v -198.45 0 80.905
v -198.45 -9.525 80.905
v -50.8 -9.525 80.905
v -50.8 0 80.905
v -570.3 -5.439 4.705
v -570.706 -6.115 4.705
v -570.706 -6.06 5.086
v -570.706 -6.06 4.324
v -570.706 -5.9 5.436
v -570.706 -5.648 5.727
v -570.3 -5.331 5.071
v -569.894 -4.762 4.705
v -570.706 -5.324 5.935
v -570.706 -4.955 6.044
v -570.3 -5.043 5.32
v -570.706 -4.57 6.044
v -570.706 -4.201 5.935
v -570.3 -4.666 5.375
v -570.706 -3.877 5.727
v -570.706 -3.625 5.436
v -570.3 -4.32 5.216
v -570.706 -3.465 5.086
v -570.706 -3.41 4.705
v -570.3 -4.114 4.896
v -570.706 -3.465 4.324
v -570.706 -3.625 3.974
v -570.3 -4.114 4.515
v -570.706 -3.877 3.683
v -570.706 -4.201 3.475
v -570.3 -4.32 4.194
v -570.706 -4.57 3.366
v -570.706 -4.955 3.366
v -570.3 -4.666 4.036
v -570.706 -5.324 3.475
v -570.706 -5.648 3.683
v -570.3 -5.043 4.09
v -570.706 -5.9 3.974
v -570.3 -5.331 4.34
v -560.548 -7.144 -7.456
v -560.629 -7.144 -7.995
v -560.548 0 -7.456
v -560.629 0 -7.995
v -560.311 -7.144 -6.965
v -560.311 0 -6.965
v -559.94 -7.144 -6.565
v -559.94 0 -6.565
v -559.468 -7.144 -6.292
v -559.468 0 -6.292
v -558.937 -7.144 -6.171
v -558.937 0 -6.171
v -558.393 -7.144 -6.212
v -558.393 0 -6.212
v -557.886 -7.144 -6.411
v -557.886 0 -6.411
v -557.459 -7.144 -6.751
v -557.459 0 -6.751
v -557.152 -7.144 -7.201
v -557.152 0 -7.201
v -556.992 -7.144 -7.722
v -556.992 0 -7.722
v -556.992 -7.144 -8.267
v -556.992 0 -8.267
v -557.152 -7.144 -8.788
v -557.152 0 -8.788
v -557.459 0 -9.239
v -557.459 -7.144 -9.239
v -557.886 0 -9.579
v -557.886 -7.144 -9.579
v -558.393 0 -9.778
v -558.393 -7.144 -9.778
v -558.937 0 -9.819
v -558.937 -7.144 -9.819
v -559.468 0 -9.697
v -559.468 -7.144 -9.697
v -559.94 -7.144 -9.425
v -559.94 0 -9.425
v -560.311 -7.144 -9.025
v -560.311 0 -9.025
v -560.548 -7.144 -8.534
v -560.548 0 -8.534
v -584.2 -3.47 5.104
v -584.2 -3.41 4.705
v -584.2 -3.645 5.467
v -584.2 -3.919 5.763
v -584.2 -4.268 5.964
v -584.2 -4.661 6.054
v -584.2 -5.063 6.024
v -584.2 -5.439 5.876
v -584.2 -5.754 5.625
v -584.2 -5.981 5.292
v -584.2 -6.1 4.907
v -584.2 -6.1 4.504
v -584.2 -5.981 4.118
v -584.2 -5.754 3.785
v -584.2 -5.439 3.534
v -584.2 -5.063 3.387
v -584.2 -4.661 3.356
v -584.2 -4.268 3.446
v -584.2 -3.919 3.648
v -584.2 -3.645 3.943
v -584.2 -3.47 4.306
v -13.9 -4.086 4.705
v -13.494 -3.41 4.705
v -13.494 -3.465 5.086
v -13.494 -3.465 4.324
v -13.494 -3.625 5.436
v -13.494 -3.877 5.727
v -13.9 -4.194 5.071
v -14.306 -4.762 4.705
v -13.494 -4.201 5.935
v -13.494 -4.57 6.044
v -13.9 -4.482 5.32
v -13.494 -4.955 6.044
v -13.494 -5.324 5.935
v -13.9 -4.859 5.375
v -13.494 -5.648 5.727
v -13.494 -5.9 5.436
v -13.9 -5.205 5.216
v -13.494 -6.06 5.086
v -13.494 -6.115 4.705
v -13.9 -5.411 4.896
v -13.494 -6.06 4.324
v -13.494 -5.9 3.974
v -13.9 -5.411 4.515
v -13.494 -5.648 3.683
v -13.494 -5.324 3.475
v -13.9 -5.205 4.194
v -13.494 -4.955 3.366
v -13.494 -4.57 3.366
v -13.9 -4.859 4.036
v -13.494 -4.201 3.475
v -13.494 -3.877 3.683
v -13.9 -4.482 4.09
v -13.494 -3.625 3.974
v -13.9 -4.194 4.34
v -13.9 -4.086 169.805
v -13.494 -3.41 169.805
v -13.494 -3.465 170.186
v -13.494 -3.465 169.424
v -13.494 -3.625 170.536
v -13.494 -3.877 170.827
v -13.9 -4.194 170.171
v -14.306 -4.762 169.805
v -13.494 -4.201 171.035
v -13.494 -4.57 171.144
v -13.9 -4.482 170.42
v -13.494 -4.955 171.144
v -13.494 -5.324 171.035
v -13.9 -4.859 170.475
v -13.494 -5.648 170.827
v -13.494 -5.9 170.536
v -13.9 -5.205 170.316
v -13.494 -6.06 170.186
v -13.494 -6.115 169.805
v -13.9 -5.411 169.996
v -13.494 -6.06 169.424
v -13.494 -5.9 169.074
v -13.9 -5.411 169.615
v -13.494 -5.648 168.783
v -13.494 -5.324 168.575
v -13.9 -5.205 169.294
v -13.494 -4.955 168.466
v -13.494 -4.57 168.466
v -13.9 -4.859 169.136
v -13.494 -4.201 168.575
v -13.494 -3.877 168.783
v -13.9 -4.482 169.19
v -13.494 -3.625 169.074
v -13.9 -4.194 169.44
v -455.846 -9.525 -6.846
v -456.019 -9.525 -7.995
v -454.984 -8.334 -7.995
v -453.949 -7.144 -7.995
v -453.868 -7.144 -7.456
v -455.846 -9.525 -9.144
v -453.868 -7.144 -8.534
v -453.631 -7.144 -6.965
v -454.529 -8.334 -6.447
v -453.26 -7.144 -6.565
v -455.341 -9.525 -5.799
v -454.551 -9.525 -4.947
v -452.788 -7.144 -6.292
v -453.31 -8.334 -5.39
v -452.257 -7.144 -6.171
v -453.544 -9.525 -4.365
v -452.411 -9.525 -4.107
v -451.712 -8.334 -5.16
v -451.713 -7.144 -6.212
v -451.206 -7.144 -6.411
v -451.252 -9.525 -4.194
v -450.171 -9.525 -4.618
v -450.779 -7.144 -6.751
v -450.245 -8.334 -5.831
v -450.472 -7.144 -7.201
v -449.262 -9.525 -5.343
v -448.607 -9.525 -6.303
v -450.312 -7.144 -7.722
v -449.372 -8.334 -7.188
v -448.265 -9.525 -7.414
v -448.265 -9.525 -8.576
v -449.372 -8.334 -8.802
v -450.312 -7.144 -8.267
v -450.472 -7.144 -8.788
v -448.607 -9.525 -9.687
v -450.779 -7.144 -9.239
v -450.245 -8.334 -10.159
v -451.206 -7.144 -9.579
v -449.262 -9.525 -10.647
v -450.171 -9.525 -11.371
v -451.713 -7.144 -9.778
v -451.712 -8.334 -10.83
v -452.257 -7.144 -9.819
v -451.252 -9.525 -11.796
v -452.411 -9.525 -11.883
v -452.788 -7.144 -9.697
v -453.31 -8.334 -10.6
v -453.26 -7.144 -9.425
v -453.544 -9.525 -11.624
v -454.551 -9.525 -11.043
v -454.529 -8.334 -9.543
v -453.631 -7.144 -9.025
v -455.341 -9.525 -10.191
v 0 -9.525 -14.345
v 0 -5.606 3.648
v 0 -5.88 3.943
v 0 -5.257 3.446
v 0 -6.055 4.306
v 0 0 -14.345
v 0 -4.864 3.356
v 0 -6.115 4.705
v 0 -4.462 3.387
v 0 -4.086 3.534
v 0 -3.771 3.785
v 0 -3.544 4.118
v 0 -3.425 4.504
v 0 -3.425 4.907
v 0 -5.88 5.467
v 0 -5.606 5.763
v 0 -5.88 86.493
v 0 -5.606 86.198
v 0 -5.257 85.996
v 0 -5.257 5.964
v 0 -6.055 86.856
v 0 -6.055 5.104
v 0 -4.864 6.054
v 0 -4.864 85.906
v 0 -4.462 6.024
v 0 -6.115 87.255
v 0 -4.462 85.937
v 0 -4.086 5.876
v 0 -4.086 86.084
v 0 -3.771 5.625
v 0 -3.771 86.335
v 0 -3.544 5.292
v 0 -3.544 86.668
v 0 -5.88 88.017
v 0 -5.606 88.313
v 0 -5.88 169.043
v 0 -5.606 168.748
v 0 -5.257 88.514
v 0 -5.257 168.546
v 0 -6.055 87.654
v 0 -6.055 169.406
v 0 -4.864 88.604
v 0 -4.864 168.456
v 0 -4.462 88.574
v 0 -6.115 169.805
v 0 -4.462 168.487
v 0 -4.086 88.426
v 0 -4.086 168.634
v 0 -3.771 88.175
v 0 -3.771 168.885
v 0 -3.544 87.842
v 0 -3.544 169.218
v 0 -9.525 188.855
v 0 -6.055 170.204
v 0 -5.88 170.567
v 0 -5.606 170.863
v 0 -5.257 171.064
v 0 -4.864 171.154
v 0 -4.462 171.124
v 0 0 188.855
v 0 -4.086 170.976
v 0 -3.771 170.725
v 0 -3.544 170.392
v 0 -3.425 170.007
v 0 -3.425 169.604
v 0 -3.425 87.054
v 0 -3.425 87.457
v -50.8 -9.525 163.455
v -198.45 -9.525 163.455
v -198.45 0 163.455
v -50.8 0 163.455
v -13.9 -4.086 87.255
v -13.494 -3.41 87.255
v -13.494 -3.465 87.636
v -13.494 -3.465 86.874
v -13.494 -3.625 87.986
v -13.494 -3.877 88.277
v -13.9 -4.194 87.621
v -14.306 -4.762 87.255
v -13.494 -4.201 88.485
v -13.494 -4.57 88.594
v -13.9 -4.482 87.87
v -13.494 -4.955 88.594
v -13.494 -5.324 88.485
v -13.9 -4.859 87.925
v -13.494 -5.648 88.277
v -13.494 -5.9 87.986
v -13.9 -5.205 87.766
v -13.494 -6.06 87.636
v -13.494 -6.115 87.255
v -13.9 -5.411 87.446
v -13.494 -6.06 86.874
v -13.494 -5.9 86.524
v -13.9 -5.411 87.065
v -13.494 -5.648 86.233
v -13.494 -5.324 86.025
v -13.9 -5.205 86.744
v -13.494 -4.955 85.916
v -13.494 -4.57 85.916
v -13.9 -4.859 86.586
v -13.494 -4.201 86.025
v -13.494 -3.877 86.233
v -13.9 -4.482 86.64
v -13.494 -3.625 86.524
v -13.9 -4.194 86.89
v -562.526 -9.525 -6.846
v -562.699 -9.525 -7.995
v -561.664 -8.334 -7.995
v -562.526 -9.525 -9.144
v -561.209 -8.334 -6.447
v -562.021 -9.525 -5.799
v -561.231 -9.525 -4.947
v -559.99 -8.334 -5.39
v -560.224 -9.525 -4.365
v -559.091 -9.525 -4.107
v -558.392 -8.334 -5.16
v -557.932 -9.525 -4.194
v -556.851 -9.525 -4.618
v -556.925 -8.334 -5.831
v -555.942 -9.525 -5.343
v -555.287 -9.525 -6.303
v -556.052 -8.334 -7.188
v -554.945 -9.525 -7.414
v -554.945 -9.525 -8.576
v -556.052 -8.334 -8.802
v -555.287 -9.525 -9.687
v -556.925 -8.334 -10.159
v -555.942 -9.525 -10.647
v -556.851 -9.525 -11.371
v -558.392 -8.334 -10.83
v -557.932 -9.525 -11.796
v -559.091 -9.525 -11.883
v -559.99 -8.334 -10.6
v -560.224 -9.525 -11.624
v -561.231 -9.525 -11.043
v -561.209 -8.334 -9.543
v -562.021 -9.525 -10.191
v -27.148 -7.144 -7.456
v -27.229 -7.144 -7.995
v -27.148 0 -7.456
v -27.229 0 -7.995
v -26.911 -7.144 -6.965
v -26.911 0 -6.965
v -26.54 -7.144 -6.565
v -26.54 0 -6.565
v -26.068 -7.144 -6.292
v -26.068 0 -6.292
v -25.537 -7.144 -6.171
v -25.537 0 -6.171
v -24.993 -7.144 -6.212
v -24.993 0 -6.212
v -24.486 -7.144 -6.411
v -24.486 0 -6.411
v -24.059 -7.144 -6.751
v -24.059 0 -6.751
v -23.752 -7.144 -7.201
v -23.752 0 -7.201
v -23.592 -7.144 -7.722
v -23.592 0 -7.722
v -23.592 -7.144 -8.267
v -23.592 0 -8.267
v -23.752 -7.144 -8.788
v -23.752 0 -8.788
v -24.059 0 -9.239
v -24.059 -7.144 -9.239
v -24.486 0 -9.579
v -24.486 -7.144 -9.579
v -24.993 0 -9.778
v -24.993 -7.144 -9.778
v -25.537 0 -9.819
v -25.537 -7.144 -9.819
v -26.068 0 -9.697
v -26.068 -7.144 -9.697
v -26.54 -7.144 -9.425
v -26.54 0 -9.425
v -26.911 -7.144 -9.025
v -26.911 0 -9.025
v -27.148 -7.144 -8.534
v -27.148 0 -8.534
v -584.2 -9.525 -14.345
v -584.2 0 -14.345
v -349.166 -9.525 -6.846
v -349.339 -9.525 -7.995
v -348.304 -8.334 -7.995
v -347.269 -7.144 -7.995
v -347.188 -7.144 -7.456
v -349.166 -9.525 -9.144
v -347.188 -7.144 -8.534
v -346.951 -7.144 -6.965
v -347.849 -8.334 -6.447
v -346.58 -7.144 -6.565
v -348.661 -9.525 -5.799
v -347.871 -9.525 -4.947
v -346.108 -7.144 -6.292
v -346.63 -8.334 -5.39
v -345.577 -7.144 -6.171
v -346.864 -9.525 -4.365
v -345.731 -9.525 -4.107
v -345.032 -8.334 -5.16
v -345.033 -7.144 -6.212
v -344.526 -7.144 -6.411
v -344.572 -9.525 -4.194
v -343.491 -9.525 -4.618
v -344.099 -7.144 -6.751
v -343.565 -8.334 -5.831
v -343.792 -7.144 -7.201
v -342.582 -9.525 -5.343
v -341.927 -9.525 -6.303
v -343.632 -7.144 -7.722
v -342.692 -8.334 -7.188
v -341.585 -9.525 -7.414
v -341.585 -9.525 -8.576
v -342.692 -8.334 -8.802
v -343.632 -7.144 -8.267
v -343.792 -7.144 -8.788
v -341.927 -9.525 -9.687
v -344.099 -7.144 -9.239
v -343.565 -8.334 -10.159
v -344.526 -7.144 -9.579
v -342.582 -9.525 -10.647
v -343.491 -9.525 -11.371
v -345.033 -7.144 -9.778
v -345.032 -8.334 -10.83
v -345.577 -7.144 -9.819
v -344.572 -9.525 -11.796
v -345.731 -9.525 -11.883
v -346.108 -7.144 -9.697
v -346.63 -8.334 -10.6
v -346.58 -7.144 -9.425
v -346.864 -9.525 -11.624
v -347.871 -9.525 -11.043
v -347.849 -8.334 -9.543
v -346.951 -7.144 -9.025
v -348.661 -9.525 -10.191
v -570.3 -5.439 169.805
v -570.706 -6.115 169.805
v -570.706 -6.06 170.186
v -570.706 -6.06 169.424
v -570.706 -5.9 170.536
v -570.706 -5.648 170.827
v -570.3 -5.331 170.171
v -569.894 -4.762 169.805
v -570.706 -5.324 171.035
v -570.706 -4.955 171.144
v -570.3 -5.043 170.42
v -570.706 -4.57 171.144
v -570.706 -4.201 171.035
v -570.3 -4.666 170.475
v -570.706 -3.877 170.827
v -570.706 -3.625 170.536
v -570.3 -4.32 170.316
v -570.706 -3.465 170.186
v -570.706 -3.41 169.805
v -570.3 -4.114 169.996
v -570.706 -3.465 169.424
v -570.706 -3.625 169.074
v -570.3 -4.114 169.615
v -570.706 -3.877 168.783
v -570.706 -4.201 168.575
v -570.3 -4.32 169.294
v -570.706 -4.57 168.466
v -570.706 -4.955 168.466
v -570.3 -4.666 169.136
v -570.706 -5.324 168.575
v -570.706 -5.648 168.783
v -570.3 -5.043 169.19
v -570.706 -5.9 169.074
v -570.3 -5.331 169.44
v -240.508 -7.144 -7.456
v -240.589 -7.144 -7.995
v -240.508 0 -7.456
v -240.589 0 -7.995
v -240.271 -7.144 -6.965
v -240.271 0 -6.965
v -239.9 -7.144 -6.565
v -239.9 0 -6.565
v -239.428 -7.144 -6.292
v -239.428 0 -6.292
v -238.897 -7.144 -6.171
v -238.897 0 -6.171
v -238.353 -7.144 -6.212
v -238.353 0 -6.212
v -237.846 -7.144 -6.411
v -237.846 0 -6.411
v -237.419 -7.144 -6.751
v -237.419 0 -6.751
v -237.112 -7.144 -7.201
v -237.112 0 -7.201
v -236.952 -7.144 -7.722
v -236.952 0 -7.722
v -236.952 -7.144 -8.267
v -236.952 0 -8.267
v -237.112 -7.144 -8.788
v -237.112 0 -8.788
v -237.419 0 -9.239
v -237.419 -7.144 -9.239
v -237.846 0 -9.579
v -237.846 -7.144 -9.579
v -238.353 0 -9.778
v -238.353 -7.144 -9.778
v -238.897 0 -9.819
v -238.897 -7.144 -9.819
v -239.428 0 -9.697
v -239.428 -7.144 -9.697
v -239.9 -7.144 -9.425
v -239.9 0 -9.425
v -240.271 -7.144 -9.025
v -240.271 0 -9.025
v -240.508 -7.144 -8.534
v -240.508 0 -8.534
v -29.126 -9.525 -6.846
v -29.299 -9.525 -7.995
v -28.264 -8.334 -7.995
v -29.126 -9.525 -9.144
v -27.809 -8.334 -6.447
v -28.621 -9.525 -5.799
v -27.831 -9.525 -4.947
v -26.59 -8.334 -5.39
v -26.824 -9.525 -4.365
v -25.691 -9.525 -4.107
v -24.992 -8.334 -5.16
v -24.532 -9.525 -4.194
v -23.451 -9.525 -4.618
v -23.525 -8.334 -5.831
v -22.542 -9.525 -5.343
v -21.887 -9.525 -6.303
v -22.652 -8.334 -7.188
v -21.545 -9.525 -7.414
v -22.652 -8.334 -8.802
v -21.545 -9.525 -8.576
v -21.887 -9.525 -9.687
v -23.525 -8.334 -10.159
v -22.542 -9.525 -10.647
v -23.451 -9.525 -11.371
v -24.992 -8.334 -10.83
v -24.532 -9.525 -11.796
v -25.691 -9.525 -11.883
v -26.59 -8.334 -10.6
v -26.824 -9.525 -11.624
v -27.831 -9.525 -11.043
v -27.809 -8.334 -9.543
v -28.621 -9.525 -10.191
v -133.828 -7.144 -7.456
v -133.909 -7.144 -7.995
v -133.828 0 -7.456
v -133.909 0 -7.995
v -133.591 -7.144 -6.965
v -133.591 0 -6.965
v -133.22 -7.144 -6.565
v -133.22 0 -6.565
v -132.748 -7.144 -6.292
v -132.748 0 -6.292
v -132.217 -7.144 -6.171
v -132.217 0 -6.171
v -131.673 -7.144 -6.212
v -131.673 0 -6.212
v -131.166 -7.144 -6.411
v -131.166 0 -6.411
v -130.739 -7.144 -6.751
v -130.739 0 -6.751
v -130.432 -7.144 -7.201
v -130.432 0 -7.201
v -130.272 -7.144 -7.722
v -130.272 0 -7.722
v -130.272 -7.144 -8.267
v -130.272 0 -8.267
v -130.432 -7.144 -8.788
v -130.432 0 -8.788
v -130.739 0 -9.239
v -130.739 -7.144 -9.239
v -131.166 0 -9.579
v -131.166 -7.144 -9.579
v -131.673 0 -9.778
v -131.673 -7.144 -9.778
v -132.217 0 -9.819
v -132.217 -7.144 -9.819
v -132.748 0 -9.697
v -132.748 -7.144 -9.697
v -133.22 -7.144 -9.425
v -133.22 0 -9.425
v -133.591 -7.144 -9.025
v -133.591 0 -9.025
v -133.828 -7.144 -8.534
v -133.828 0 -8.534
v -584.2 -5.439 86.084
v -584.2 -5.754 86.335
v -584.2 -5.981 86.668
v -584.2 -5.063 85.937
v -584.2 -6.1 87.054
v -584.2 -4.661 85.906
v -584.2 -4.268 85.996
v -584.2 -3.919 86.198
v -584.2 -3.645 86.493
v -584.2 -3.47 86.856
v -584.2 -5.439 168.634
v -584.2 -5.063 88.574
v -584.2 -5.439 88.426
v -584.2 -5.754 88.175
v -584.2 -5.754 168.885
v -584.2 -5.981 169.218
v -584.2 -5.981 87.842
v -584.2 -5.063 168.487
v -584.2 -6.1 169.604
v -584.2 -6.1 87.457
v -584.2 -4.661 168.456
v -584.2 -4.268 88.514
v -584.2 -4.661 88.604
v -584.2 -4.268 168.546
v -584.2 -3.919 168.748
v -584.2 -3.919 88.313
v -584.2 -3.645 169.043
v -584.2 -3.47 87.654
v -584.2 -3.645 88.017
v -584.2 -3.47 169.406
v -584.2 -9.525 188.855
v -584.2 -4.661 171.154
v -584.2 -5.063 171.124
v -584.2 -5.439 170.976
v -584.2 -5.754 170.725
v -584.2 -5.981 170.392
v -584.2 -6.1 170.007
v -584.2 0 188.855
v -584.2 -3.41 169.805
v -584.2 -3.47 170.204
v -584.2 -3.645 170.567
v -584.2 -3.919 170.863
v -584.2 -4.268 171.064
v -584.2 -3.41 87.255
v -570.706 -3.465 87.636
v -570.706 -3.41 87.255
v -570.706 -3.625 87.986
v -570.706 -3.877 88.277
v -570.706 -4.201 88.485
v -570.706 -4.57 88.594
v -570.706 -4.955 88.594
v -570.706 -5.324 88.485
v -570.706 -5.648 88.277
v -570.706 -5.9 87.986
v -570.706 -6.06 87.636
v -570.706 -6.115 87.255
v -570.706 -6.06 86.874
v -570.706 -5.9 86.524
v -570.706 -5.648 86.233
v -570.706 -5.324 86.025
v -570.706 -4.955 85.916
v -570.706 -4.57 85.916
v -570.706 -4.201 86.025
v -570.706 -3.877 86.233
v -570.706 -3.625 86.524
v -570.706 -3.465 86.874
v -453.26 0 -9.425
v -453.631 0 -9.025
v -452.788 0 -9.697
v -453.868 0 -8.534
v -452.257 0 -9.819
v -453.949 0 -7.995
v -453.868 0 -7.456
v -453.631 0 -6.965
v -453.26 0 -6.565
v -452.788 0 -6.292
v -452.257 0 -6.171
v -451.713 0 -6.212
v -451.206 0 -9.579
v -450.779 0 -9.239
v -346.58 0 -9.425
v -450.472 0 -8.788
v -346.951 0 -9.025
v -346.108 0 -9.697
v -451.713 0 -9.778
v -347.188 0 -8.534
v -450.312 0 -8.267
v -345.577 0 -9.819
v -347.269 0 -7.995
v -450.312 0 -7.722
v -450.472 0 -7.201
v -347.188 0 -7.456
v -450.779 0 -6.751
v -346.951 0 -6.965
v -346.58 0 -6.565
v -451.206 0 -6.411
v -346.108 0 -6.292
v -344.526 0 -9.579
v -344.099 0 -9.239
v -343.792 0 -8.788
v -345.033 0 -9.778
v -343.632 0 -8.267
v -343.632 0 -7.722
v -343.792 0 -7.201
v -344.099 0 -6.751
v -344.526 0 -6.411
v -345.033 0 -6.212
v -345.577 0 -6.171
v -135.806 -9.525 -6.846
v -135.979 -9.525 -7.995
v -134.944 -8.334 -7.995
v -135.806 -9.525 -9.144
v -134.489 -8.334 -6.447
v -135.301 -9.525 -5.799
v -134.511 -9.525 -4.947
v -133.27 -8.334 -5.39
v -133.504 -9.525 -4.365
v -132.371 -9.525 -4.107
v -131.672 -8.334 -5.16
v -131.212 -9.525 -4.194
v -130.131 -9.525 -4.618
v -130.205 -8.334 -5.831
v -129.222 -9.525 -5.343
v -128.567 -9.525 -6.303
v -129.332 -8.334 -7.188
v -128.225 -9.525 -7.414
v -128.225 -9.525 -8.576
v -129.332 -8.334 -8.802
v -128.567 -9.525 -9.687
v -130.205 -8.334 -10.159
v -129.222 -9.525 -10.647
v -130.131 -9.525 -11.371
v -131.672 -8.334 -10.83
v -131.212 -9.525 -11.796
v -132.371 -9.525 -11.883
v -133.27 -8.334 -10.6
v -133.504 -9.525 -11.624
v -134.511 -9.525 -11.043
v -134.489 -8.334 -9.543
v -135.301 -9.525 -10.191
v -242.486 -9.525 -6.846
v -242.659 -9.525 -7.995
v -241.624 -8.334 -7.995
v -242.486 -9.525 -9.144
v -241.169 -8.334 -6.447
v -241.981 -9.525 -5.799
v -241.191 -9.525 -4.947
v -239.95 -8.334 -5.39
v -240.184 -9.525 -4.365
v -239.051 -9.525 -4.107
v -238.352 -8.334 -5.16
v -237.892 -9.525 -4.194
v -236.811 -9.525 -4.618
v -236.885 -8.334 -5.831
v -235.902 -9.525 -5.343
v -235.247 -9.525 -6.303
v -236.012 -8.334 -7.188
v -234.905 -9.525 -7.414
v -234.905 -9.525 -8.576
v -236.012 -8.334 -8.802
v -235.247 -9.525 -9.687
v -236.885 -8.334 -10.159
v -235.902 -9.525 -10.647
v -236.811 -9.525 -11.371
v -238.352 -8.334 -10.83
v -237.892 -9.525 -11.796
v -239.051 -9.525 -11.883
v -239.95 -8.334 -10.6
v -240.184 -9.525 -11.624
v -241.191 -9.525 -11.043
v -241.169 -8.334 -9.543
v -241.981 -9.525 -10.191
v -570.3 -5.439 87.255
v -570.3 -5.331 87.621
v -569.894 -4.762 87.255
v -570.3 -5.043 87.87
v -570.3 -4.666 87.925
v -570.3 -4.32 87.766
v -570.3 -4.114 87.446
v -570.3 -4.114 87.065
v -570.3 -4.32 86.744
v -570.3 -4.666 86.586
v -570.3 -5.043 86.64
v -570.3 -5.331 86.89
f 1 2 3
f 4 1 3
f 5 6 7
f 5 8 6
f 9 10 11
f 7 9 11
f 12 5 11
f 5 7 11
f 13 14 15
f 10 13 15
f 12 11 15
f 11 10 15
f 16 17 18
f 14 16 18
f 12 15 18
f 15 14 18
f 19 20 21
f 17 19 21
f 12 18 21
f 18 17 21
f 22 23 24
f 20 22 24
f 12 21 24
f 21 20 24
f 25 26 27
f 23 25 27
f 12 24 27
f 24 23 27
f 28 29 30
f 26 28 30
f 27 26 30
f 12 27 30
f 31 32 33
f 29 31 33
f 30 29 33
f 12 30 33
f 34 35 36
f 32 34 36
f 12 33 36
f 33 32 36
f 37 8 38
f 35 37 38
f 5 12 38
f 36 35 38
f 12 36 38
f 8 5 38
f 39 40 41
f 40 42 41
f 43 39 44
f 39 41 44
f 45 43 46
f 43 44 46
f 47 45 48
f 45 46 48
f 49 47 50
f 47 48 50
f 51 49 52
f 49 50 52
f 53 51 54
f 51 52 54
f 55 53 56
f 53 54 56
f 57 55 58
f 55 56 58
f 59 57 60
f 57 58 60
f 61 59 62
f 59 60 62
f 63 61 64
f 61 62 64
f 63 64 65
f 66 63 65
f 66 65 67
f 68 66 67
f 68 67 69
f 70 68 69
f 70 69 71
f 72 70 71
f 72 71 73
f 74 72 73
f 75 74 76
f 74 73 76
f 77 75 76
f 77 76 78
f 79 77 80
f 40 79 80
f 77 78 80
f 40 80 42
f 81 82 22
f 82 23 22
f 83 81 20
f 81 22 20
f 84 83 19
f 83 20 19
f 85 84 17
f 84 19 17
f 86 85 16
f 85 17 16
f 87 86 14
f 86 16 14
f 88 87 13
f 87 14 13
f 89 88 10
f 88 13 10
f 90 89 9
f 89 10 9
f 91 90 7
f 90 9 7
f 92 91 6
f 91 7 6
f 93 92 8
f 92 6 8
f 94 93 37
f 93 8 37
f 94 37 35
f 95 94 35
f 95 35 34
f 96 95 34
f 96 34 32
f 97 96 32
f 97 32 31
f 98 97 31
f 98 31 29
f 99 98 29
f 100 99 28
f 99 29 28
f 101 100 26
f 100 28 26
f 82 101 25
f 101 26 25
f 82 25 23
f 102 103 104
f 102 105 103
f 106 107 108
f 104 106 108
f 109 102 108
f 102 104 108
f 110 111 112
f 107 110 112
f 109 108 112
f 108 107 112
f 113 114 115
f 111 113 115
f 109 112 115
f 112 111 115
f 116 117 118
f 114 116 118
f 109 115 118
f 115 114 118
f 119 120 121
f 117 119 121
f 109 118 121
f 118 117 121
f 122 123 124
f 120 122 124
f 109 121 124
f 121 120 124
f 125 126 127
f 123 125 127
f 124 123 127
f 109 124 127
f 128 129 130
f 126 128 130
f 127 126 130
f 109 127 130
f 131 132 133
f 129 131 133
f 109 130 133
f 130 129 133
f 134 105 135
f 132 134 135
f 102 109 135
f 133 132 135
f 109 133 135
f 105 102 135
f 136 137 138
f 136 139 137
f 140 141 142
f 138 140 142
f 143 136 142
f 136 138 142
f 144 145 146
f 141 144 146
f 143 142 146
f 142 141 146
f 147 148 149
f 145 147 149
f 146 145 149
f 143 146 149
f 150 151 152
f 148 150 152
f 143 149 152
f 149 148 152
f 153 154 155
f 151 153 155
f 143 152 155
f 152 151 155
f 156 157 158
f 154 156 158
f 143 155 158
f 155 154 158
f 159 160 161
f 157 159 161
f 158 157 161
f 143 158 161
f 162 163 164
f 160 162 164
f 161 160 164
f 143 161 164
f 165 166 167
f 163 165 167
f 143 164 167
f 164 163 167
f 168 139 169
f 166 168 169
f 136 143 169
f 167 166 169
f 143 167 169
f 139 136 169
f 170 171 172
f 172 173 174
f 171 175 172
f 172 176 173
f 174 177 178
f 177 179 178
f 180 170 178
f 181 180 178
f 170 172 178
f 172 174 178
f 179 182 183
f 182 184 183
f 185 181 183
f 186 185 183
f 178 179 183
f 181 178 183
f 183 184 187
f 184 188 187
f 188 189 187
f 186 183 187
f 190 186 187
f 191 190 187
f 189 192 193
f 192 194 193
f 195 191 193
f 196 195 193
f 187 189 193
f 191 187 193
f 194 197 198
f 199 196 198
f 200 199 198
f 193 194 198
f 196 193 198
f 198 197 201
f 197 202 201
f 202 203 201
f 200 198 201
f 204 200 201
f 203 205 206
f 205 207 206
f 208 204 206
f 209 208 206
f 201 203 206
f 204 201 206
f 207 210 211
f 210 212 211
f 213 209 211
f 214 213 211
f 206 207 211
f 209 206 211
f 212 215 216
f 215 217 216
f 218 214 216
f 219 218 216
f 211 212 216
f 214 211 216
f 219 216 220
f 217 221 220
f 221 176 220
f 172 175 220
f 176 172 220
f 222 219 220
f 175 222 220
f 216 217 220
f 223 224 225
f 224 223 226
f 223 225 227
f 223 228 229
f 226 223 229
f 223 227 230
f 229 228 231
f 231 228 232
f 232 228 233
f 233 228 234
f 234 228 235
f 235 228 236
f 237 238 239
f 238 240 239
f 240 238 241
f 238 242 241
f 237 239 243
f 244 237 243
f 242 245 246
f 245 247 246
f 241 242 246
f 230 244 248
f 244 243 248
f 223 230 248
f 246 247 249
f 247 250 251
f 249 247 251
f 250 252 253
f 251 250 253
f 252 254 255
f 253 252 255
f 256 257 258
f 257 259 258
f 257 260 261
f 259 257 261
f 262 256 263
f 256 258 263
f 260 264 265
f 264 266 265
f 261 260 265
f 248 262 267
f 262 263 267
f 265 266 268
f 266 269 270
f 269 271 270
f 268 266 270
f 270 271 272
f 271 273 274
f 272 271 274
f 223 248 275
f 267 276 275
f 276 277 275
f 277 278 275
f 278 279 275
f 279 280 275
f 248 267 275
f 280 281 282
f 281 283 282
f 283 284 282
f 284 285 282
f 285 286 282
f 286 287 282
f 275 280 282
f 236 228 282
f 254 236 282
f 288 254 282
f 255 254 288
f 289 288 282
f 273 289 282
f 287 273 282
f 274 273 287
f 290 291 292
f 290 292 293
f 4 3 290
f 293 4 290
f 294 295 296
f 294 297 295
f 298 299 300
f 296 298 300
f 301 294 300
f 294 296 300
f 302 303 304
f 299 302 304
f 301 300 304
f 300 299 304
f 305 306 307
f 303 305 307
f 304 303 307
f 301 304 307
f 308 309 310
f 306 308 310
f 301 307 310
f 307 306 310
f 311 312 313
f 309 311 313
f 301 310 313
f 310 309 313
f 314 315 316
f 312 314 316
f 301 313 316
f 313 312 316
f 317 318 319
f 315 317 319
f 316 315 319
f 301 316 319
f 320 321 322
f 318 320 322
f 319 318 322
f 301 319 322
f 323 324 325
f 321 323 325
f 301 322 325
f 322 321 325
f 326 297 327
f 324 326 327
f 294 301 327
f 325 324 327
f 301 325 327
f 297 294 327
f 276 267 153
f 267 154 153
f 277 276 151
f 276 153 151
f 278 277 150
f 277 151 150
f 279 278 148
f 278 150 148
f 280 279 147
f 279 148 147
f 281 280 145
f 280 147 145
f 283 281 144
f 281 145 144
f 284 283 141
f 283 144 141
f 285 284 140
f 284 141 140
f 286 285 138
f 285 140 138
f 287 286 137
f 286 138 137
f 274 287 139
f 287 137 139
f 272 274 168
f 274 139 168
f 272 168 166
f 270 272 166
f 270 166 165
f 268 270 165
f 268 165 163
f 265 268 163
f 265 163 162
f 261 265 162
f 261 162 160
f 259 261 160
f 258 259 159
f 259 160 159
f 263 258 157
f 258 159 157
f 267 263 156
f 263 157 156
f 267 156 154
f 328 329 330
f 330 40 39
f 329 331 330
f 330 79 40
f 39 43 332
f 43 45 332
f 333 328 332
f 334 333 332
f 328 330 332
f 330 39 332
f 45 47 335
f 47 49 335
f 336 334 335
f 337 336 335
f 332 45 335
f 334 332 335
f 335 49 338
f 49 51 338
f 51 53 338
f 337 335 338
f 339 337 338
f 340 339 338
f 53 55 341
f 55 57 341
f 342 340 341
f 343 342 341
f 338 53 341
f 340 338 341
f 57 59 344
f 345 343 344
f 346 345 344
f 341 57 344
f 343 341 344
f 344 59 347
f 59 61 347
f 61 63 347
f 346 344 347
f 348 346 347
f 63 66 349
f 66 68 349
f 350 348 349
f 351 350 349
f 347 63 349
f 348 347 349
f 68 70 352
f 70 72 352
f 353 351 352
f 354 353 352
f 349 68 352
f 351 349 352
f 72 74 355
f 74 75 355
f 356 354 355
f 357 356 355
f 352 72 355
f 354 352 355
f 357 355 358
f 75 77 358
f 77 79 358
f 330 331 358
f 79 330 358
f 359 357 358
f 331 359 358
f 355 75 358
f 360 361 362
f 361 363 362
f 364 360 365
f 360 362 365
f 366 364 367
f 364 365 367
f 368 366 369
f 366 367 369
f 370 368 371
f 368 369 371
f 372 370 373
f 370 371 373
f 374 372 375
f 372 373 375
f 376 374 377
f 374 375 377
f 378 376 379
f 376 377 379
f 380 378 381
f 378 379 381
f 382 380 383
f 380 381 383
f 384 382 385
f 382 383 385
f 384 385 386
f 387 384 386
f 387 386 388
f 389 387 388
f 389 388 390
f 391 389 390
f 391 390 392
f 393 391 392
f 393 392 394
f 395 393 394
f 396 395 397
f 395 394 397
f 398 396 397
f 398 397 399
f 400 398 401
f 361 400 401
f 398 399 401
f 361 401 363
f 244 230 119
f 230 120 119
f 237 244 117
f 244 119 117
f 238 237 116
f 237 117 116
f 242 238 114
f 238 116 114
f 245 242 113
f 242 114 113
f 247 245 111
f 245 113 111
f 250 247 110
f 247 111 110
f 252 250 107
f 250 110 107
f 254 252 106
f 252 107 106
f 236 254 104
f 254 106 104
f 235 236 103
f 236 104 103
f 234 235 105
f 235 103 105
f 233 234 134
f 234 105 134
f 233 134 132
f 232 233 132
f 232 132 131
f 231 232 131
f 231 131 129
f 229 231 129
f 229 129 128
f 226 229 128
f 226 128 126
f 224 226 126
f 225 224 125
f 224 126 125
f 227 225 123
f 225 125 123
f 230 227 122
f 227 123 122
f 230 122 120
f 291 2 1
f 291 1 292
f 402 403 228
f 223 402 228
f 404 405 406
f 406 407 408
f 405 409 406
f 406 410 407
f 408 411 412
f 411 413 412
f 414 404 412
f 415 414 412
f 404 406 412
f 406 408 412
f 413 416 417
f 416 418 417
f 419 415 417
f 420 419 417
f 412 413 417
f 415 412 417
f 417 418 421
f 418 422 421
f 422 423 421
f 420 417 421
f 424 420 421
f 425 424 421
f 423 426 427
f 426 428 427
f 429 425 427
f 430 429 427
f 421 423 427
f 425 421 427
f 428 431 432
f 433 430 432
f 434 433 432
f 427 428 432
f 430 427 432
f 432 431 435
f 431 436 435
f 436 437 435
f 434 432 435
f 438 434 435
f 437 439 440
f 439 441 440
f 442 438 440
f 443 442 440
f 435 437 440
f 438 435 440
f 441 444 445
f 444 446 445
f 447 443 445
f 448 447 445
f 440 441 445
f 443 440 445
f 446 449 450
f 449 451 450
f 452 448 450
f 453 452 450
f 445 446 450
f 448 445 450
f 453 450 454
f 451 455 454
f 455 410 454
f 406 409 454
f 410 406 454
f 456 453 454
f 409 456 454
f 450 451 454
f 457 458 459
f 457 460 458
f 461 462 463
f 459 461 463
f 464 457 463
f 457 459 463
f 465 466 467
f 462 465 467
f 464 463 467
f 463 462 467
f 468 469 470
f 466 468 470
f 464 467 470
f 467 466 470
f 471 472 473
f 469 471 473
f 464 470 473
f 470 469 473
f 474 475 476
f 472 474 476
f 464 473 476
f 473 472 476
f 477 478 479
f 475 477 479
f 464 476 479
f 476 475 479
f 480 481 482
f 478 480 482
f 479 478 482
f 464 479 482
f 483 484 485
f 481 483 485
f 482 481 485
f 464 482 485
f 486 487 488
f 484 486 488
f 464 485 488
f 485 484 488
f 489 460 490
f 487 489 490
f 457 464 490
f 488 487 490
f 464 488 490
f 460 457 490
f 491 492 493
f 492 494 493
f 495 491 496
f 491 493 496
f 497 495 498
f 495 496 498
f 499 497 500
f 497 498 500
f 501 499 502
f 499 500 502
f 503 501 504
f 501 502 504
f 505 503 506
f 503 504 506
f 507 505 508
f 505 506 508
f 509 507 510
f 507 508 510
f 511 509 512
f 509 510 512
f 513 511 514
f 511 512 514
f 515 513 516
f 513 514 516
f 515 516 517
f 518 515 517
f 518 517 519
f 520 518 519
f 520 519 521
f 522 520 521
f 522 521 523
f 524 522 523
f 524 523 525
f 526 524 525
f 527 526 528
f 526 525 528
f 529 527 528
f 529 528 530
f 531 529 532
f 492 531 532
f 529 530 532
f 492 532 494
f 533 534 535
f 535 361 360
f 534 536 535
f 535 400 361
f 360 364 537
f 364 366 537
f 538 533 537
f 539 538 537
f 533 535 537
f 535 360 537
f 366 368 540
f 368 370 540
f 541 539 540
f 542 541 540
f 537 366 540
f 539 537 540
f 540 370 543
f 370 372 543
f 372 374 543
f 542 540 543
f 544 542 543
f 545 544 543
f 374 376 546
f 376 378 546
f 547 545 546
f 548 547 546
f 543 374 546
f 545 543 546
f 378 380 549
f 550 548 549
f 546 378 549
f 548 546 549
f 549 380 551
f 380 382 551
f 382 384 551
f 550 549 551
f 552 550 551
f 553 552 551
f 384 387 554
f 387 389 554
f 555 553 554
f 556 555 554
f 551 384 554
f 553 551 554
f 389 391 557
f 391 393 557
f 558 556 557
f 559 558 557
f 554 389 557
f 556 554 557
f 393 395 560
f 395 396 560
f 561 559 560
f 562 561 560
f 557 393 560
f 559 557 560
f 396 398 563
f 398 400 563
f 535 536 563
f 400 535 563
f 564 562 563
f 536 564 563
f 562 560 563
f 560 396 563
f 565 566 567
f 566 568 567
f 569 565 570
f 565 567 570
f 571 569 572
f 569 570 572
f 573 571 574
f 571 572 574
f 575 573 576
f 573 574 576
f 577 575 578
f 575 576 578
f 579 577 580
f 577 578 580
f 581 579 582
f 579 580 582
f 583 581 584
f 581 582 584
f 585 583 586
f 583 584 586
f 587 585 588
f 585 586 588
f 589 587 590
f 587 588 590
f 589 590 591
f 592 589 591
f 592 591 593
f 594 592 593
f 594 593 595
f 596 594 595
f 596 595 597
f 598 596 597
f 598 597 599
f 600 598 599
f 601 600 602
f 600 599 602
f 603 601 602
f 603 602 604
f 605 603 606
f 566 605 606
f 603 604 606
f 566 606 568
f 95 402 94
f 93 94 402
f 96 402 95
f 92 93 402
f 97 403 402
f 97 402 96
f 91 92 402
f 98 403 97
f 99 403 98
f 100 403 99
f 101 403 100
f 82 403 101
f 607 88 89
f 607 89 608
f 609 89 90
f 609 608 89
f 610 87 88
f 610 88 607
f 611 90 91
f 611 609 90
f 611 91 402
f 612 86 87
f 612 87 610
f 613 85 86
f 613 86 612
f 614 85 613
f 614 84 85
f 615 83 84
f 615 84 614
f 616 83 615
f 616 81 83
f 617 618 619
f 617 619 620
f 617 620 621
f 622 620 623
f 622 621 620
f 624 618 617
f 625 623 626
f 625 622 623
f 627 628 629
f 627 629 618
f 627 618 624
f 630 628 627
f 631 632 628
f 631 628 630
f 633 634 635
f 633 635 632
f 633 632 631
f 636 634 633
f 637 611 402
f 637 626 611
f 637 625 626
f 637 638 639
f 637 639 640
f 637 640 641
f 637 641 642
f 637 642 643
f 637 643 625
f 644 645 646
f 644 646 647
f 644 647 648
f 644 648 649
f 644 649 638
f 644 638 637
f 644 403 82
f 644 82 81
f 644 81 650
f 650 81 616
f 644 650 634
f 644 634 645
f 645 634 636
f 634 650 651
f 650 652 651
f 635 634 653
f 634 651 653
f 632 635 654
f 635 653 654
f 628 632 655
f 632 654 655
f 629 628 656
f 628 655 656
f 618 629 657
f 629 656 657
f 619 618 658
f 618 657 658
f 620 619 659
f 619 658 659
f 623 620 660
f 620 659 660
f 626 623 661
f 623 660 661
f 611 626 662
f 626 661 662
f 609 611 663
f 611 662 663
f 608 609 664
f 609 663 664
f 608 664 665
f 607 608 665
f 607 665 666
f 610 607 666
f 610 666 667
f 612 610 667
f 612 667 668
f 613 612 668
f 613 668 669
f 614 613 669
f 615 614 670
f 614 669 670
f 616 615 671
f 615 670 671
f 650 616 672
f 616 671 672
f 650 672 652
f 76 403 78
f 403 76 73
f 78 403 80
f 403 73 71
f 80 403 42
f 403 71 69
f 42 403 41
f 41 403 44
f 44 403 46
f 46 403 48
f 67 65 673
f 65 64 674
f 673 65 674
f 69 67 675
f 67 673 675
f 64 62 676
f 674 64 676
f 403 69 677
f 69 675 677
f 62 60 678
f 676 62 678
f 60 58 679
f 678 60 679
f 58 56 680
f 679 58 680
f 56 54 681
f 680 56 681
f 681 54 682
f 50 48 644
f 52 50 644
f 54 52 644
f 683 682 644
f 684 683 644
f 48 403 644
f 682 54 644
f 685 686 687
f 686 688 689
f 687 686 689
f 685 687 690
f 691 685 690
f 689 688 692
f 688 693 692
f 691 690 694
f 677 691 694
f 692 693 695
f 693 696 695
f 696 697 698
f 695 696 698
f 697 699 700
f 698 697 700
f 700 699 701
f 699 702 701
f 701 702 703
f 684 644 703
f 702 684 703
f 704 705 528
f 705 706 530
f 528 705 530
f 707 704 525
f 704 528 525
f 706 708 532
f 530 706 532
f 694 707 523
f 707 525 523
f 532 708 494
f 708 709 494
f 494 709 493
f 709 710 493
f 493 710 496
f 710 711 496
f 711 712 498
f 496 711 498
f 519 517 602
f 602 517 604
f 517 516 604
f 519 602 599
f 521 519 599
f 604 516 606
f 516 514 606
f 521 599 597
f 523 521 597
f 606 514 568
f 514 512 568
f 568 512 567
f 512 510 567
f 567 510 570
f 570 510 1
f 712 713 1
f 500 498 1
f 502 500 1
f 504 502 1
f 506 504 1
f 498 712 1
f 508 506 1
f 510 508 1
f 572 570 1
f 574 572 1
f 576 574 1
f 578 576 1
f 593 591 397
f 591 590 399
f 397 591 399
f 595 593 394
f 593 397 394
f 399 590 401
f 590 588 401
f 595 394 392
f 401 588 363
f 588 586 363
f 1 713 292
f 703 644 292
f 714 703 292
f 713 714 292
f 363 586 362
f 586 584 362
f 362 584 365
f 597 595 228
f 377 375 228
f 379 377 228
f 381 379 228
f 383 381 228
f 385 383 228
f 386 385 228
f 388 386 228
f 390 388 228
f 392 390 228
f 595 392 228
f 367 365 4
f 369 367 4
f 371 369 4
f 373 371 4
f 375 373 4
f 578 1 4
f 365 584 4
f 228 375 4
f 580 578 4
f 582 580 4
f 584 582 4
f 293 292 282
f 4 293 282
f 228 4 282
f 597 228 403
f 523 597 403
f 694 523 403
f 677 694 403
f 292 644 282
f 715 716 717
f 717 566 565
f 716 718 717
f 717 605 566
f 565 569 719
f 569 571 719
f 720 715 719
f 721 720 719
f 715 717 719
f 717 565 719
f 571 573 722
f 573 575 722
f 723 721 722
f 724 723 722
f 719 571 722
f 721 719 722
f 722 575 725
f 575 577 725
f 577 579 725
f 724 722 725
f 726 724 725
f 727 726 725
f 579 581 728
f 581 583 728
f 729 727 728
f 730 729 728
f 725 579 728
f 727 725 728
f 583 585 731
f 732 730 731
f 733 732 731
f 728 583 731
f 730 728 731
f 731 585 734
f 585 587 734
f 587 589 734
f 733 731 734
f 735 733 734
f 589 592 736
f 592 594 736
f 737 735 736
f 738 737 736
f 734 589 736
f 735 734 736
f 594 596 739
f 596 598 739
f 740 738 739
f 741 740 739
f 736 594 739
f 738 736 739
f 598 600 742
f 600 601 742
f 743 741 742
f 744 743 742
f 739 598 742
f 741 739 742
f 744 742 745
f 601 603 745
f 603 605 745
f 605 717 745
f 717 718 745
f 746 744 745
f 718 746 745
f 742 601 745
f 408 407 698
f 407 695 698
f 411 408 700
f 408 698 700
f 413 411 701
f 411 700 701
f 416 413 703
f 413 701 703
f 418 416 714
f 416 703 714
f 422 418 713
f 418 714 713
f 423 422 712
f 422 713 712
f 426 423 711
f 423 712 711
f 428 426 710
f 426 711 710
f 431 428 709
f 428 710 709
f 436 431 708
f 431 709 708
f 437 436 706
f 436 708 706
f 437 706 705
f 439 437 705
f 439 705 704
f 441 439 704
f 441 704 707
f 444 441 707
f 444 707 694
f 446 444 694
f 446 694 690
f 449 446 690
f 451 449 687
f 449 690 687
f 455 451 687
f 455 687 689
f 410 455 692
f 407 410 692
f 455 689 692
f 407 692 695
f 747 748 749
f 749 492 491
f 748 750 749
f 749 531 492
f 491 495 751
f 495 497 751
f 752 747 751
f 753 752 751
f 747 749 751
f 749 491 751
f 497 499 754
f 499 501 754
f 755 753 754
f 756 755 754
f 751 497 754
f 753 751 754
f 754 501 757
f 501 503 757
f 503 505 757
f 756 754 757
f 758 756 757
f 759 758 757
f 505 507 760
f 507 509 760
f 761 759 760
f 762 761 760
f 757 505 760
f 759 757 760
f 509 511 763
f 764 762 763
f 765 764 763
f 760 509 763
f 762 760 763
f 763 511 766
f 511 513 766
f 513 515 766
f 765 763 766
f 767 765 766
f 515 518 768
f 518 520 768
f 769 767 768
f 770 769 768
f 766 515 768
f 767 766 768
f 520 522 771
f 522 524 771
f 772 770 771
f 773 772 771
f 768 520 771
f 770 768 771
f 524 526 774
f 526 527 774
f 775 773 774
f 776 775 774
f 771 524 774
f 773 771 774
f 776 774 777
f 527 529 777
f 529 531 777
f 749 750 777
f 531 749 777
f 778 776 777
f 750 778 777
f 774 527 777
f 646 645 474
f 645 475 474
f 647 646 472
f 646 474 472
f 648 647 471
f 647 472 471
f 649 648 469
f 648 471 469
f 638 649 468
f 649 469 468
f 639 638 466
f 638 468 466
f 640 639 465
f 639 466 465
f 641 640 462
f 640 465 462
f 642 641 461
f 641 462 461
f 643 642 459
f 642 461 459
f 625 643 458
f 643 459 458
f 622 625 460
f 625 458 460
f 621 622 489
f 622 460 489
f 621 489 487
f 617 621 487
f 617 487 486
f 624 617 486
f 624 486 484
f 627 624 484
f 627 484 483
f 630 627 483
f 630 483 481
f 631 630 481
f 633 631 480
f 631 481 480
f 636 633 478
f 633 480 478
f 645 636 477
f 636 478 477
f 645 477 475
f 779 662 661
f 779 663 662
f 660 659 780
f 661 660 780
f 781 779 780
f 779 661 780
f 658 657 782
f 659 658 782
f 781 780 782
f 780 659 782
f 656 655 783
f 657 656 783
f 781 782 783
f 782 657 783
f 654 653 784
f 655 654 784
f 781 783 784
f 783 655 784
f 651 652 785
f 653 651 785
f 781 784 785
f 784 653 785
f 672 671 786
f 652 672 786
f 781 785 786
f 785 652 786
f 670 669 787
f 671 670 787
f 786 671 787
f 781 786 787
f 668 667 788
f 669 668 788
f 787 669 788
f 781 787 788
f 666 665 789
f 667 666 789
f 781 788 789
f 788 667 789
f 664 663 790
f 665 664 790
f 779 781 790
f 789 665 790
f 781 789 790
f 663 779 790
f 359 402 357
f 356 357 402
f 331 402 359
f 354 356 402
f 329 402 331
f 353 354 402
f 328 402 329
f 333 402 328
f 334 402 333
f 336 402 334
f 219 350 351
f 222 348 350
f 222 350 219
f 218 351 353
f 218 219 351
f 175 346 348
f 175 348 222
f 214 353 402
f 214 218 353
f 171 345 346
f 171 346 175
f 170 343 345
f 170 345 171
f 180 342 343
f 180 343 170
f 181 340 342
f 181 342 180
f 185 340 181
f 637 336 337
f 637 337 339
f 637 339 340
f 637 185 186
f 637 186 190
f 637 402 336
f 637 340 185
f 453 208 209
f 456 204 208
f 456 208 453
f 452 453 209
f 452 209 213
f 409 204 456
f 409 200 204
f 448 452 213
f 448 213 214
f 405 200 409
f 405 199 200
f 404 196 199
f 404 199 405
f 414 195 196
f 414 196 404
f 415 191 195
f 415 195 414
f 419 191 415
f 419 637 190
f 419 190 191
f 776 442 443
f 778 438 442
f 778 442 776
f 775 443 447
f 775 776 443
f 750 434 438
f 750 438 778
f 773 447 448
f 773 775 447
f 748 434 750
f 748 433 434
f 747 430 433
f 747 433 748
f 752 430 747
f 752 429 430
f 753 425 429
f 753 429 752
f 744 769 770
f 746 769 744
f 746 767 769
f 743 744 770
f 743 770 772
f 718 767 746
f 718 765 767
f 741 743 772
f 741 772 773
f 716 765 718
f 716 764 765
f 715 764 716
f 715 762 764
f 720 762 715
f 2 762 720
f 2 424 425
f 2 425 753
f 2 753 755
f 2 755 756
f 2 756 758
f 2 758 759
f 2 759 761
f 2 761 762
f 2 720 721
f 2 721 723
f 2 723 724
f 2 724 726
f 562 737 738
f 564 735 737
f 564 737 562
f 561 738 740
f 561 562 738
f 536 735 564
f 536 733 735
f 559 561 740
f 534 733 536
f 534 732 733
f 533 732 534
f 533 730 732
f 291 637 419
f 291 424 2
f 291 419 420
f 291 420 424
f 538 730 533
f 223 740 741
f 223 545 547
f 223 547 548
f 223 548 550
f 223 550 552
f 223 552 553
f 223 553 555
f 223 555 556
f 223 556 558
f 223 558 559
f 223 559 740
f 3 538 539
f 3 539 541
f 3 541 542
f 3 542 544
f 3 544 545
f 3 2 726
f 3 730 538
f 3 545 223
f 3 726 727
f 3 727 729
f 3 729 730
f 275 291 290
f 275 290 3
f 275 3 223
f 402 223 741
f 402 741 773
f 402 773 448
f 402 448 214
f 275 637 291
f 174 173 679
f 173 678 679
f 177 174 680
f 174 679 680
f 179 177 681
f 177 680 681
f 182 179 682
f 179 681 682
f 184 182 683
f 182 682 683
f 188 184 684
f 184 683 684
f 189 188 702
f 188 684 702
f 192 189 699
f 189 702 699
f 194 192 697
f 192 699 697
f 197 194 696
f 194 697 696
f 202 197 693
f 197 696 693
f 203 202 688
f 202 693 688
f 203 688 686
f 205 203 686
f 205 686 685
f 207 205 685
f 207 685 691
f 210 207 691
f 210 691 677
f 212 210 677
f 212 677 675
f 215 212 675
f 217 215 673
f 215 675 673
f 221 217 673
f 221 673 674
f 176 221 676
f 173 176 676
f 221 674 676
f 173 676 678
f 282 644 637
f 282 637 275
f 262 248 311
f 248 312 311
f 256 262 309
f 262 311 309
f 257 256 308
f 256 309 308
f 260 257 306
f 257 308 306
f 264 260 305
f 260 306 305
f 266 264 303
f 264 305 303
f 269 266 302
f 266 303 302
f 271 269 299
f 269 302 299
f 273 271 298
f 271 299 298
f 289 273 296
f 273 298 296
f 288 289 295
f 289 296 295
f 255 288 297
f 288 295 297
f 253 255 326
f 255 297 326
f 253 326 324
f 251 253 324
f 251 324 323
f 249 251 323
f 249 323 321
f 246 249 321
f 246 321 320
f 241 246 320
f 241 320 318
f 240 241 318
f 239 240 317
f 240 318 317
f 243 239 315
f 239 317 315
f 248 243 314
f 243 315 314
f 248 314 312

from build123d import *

# Parameters (mm, degrees)
F0_W           = 584.2
F0_H           = 203.2
F1_DEPTH       = 9.525
F3_D           = 3.6576
F3_DEPTH       = 10.3124
F3_CSINK_D     = 7.7978
F3_CSINK_ANGLE = 82
F3_TIP         = 1.0988539001
F4_W           = 147.6502
F4_H           = 82.55
F5_DEPTH       = 9.526
F7_D           = 2.7051
F7_DEPTH       = 13.49375
F7_TIP         = 0.8126940303
F9_D           = 2.7051
F9_DEPTH       = 13.49375
F9_TIP         = 0.8126940303


# Not quite as in the source:
# - a feature names something its author has since deleted; it is built from what else it names


with BuildPart() as f1:
    # F0 (on Front) → F1 (new body)
    with BuildSketch(Plane.XZ):
        with Locations((-292.1, 87.2551402715)):
            Rectangle(F0_W, F0_H)
    extrude(amount=F1_DEPTH)

    # F3
    with Locations(Plane.XZ.offset(9.525)):
        with Locations((-558.8, -7.9948597285), (-345.44, -7.9948597285), (-452.12, -7.9948597285), (-238.76, -7.9948597285), (-132.08, -7.9948597285), (-25.4, -7.9948597285)):
            CounterSinkHole(F3_D / 2, F3_CSINK_D / 2, depth=F3_DEPTH, counter_sink_angle=F3_CSINK_ANGLE)
            with Locations((0, 0, -(F3_DEPTH + F3_TIP / 2))):  # 118° drill point
                Cone(0, F3_D / 2, F3_TIP, mode=Mode.SUBTRACT)

    # F4 (on face) → F5 (cut, through all)
    with BuildSketch(Plane.XZ.offset(9.525)):
        with Locations((-124.6251, 122.1801402715)):
            Rectangle(F4_W, F4_H)
    extrude(amount=-F5_DEPTH, mode=Mode.SUBTRACT)

    # F7
    with Locations(Plane(origin=(-584.2, 0, 0), x_dir=(0, -1, 0), z_dir=(-1, 0, 0))):
        with Locations((4.7625, 169.8051402715), (4.7625, 87.2551402715), (4.7625, 4.7051402715)):
            Hole(F7_D / 2, depth=F7_DEPTH)
            with Locations((0, 0, -(F7_DEPTH + F7_TIP / 2))):  # 118° drill point
                Cone(0, F7_D / 2, F7_TIP, mode=Mode.SUBTRACT)

    # F9
    with Locations(Plane.YZ):
        with Locations((-4.7625, 4.7051402715), (-4.7625, 87.2551402715), (-4.7625, 169.8051402715)):
            Hole(F9_D / 2, depth=F9_DEPTH)
            with Locations((0, 0, -(F9_DEPTH + F9_TIP / 2))):  # 118° drill point
                Cone(0, F9_D / 2, F9_TIP, mode=Mode.SUBTRACT)


solid = f1.part
